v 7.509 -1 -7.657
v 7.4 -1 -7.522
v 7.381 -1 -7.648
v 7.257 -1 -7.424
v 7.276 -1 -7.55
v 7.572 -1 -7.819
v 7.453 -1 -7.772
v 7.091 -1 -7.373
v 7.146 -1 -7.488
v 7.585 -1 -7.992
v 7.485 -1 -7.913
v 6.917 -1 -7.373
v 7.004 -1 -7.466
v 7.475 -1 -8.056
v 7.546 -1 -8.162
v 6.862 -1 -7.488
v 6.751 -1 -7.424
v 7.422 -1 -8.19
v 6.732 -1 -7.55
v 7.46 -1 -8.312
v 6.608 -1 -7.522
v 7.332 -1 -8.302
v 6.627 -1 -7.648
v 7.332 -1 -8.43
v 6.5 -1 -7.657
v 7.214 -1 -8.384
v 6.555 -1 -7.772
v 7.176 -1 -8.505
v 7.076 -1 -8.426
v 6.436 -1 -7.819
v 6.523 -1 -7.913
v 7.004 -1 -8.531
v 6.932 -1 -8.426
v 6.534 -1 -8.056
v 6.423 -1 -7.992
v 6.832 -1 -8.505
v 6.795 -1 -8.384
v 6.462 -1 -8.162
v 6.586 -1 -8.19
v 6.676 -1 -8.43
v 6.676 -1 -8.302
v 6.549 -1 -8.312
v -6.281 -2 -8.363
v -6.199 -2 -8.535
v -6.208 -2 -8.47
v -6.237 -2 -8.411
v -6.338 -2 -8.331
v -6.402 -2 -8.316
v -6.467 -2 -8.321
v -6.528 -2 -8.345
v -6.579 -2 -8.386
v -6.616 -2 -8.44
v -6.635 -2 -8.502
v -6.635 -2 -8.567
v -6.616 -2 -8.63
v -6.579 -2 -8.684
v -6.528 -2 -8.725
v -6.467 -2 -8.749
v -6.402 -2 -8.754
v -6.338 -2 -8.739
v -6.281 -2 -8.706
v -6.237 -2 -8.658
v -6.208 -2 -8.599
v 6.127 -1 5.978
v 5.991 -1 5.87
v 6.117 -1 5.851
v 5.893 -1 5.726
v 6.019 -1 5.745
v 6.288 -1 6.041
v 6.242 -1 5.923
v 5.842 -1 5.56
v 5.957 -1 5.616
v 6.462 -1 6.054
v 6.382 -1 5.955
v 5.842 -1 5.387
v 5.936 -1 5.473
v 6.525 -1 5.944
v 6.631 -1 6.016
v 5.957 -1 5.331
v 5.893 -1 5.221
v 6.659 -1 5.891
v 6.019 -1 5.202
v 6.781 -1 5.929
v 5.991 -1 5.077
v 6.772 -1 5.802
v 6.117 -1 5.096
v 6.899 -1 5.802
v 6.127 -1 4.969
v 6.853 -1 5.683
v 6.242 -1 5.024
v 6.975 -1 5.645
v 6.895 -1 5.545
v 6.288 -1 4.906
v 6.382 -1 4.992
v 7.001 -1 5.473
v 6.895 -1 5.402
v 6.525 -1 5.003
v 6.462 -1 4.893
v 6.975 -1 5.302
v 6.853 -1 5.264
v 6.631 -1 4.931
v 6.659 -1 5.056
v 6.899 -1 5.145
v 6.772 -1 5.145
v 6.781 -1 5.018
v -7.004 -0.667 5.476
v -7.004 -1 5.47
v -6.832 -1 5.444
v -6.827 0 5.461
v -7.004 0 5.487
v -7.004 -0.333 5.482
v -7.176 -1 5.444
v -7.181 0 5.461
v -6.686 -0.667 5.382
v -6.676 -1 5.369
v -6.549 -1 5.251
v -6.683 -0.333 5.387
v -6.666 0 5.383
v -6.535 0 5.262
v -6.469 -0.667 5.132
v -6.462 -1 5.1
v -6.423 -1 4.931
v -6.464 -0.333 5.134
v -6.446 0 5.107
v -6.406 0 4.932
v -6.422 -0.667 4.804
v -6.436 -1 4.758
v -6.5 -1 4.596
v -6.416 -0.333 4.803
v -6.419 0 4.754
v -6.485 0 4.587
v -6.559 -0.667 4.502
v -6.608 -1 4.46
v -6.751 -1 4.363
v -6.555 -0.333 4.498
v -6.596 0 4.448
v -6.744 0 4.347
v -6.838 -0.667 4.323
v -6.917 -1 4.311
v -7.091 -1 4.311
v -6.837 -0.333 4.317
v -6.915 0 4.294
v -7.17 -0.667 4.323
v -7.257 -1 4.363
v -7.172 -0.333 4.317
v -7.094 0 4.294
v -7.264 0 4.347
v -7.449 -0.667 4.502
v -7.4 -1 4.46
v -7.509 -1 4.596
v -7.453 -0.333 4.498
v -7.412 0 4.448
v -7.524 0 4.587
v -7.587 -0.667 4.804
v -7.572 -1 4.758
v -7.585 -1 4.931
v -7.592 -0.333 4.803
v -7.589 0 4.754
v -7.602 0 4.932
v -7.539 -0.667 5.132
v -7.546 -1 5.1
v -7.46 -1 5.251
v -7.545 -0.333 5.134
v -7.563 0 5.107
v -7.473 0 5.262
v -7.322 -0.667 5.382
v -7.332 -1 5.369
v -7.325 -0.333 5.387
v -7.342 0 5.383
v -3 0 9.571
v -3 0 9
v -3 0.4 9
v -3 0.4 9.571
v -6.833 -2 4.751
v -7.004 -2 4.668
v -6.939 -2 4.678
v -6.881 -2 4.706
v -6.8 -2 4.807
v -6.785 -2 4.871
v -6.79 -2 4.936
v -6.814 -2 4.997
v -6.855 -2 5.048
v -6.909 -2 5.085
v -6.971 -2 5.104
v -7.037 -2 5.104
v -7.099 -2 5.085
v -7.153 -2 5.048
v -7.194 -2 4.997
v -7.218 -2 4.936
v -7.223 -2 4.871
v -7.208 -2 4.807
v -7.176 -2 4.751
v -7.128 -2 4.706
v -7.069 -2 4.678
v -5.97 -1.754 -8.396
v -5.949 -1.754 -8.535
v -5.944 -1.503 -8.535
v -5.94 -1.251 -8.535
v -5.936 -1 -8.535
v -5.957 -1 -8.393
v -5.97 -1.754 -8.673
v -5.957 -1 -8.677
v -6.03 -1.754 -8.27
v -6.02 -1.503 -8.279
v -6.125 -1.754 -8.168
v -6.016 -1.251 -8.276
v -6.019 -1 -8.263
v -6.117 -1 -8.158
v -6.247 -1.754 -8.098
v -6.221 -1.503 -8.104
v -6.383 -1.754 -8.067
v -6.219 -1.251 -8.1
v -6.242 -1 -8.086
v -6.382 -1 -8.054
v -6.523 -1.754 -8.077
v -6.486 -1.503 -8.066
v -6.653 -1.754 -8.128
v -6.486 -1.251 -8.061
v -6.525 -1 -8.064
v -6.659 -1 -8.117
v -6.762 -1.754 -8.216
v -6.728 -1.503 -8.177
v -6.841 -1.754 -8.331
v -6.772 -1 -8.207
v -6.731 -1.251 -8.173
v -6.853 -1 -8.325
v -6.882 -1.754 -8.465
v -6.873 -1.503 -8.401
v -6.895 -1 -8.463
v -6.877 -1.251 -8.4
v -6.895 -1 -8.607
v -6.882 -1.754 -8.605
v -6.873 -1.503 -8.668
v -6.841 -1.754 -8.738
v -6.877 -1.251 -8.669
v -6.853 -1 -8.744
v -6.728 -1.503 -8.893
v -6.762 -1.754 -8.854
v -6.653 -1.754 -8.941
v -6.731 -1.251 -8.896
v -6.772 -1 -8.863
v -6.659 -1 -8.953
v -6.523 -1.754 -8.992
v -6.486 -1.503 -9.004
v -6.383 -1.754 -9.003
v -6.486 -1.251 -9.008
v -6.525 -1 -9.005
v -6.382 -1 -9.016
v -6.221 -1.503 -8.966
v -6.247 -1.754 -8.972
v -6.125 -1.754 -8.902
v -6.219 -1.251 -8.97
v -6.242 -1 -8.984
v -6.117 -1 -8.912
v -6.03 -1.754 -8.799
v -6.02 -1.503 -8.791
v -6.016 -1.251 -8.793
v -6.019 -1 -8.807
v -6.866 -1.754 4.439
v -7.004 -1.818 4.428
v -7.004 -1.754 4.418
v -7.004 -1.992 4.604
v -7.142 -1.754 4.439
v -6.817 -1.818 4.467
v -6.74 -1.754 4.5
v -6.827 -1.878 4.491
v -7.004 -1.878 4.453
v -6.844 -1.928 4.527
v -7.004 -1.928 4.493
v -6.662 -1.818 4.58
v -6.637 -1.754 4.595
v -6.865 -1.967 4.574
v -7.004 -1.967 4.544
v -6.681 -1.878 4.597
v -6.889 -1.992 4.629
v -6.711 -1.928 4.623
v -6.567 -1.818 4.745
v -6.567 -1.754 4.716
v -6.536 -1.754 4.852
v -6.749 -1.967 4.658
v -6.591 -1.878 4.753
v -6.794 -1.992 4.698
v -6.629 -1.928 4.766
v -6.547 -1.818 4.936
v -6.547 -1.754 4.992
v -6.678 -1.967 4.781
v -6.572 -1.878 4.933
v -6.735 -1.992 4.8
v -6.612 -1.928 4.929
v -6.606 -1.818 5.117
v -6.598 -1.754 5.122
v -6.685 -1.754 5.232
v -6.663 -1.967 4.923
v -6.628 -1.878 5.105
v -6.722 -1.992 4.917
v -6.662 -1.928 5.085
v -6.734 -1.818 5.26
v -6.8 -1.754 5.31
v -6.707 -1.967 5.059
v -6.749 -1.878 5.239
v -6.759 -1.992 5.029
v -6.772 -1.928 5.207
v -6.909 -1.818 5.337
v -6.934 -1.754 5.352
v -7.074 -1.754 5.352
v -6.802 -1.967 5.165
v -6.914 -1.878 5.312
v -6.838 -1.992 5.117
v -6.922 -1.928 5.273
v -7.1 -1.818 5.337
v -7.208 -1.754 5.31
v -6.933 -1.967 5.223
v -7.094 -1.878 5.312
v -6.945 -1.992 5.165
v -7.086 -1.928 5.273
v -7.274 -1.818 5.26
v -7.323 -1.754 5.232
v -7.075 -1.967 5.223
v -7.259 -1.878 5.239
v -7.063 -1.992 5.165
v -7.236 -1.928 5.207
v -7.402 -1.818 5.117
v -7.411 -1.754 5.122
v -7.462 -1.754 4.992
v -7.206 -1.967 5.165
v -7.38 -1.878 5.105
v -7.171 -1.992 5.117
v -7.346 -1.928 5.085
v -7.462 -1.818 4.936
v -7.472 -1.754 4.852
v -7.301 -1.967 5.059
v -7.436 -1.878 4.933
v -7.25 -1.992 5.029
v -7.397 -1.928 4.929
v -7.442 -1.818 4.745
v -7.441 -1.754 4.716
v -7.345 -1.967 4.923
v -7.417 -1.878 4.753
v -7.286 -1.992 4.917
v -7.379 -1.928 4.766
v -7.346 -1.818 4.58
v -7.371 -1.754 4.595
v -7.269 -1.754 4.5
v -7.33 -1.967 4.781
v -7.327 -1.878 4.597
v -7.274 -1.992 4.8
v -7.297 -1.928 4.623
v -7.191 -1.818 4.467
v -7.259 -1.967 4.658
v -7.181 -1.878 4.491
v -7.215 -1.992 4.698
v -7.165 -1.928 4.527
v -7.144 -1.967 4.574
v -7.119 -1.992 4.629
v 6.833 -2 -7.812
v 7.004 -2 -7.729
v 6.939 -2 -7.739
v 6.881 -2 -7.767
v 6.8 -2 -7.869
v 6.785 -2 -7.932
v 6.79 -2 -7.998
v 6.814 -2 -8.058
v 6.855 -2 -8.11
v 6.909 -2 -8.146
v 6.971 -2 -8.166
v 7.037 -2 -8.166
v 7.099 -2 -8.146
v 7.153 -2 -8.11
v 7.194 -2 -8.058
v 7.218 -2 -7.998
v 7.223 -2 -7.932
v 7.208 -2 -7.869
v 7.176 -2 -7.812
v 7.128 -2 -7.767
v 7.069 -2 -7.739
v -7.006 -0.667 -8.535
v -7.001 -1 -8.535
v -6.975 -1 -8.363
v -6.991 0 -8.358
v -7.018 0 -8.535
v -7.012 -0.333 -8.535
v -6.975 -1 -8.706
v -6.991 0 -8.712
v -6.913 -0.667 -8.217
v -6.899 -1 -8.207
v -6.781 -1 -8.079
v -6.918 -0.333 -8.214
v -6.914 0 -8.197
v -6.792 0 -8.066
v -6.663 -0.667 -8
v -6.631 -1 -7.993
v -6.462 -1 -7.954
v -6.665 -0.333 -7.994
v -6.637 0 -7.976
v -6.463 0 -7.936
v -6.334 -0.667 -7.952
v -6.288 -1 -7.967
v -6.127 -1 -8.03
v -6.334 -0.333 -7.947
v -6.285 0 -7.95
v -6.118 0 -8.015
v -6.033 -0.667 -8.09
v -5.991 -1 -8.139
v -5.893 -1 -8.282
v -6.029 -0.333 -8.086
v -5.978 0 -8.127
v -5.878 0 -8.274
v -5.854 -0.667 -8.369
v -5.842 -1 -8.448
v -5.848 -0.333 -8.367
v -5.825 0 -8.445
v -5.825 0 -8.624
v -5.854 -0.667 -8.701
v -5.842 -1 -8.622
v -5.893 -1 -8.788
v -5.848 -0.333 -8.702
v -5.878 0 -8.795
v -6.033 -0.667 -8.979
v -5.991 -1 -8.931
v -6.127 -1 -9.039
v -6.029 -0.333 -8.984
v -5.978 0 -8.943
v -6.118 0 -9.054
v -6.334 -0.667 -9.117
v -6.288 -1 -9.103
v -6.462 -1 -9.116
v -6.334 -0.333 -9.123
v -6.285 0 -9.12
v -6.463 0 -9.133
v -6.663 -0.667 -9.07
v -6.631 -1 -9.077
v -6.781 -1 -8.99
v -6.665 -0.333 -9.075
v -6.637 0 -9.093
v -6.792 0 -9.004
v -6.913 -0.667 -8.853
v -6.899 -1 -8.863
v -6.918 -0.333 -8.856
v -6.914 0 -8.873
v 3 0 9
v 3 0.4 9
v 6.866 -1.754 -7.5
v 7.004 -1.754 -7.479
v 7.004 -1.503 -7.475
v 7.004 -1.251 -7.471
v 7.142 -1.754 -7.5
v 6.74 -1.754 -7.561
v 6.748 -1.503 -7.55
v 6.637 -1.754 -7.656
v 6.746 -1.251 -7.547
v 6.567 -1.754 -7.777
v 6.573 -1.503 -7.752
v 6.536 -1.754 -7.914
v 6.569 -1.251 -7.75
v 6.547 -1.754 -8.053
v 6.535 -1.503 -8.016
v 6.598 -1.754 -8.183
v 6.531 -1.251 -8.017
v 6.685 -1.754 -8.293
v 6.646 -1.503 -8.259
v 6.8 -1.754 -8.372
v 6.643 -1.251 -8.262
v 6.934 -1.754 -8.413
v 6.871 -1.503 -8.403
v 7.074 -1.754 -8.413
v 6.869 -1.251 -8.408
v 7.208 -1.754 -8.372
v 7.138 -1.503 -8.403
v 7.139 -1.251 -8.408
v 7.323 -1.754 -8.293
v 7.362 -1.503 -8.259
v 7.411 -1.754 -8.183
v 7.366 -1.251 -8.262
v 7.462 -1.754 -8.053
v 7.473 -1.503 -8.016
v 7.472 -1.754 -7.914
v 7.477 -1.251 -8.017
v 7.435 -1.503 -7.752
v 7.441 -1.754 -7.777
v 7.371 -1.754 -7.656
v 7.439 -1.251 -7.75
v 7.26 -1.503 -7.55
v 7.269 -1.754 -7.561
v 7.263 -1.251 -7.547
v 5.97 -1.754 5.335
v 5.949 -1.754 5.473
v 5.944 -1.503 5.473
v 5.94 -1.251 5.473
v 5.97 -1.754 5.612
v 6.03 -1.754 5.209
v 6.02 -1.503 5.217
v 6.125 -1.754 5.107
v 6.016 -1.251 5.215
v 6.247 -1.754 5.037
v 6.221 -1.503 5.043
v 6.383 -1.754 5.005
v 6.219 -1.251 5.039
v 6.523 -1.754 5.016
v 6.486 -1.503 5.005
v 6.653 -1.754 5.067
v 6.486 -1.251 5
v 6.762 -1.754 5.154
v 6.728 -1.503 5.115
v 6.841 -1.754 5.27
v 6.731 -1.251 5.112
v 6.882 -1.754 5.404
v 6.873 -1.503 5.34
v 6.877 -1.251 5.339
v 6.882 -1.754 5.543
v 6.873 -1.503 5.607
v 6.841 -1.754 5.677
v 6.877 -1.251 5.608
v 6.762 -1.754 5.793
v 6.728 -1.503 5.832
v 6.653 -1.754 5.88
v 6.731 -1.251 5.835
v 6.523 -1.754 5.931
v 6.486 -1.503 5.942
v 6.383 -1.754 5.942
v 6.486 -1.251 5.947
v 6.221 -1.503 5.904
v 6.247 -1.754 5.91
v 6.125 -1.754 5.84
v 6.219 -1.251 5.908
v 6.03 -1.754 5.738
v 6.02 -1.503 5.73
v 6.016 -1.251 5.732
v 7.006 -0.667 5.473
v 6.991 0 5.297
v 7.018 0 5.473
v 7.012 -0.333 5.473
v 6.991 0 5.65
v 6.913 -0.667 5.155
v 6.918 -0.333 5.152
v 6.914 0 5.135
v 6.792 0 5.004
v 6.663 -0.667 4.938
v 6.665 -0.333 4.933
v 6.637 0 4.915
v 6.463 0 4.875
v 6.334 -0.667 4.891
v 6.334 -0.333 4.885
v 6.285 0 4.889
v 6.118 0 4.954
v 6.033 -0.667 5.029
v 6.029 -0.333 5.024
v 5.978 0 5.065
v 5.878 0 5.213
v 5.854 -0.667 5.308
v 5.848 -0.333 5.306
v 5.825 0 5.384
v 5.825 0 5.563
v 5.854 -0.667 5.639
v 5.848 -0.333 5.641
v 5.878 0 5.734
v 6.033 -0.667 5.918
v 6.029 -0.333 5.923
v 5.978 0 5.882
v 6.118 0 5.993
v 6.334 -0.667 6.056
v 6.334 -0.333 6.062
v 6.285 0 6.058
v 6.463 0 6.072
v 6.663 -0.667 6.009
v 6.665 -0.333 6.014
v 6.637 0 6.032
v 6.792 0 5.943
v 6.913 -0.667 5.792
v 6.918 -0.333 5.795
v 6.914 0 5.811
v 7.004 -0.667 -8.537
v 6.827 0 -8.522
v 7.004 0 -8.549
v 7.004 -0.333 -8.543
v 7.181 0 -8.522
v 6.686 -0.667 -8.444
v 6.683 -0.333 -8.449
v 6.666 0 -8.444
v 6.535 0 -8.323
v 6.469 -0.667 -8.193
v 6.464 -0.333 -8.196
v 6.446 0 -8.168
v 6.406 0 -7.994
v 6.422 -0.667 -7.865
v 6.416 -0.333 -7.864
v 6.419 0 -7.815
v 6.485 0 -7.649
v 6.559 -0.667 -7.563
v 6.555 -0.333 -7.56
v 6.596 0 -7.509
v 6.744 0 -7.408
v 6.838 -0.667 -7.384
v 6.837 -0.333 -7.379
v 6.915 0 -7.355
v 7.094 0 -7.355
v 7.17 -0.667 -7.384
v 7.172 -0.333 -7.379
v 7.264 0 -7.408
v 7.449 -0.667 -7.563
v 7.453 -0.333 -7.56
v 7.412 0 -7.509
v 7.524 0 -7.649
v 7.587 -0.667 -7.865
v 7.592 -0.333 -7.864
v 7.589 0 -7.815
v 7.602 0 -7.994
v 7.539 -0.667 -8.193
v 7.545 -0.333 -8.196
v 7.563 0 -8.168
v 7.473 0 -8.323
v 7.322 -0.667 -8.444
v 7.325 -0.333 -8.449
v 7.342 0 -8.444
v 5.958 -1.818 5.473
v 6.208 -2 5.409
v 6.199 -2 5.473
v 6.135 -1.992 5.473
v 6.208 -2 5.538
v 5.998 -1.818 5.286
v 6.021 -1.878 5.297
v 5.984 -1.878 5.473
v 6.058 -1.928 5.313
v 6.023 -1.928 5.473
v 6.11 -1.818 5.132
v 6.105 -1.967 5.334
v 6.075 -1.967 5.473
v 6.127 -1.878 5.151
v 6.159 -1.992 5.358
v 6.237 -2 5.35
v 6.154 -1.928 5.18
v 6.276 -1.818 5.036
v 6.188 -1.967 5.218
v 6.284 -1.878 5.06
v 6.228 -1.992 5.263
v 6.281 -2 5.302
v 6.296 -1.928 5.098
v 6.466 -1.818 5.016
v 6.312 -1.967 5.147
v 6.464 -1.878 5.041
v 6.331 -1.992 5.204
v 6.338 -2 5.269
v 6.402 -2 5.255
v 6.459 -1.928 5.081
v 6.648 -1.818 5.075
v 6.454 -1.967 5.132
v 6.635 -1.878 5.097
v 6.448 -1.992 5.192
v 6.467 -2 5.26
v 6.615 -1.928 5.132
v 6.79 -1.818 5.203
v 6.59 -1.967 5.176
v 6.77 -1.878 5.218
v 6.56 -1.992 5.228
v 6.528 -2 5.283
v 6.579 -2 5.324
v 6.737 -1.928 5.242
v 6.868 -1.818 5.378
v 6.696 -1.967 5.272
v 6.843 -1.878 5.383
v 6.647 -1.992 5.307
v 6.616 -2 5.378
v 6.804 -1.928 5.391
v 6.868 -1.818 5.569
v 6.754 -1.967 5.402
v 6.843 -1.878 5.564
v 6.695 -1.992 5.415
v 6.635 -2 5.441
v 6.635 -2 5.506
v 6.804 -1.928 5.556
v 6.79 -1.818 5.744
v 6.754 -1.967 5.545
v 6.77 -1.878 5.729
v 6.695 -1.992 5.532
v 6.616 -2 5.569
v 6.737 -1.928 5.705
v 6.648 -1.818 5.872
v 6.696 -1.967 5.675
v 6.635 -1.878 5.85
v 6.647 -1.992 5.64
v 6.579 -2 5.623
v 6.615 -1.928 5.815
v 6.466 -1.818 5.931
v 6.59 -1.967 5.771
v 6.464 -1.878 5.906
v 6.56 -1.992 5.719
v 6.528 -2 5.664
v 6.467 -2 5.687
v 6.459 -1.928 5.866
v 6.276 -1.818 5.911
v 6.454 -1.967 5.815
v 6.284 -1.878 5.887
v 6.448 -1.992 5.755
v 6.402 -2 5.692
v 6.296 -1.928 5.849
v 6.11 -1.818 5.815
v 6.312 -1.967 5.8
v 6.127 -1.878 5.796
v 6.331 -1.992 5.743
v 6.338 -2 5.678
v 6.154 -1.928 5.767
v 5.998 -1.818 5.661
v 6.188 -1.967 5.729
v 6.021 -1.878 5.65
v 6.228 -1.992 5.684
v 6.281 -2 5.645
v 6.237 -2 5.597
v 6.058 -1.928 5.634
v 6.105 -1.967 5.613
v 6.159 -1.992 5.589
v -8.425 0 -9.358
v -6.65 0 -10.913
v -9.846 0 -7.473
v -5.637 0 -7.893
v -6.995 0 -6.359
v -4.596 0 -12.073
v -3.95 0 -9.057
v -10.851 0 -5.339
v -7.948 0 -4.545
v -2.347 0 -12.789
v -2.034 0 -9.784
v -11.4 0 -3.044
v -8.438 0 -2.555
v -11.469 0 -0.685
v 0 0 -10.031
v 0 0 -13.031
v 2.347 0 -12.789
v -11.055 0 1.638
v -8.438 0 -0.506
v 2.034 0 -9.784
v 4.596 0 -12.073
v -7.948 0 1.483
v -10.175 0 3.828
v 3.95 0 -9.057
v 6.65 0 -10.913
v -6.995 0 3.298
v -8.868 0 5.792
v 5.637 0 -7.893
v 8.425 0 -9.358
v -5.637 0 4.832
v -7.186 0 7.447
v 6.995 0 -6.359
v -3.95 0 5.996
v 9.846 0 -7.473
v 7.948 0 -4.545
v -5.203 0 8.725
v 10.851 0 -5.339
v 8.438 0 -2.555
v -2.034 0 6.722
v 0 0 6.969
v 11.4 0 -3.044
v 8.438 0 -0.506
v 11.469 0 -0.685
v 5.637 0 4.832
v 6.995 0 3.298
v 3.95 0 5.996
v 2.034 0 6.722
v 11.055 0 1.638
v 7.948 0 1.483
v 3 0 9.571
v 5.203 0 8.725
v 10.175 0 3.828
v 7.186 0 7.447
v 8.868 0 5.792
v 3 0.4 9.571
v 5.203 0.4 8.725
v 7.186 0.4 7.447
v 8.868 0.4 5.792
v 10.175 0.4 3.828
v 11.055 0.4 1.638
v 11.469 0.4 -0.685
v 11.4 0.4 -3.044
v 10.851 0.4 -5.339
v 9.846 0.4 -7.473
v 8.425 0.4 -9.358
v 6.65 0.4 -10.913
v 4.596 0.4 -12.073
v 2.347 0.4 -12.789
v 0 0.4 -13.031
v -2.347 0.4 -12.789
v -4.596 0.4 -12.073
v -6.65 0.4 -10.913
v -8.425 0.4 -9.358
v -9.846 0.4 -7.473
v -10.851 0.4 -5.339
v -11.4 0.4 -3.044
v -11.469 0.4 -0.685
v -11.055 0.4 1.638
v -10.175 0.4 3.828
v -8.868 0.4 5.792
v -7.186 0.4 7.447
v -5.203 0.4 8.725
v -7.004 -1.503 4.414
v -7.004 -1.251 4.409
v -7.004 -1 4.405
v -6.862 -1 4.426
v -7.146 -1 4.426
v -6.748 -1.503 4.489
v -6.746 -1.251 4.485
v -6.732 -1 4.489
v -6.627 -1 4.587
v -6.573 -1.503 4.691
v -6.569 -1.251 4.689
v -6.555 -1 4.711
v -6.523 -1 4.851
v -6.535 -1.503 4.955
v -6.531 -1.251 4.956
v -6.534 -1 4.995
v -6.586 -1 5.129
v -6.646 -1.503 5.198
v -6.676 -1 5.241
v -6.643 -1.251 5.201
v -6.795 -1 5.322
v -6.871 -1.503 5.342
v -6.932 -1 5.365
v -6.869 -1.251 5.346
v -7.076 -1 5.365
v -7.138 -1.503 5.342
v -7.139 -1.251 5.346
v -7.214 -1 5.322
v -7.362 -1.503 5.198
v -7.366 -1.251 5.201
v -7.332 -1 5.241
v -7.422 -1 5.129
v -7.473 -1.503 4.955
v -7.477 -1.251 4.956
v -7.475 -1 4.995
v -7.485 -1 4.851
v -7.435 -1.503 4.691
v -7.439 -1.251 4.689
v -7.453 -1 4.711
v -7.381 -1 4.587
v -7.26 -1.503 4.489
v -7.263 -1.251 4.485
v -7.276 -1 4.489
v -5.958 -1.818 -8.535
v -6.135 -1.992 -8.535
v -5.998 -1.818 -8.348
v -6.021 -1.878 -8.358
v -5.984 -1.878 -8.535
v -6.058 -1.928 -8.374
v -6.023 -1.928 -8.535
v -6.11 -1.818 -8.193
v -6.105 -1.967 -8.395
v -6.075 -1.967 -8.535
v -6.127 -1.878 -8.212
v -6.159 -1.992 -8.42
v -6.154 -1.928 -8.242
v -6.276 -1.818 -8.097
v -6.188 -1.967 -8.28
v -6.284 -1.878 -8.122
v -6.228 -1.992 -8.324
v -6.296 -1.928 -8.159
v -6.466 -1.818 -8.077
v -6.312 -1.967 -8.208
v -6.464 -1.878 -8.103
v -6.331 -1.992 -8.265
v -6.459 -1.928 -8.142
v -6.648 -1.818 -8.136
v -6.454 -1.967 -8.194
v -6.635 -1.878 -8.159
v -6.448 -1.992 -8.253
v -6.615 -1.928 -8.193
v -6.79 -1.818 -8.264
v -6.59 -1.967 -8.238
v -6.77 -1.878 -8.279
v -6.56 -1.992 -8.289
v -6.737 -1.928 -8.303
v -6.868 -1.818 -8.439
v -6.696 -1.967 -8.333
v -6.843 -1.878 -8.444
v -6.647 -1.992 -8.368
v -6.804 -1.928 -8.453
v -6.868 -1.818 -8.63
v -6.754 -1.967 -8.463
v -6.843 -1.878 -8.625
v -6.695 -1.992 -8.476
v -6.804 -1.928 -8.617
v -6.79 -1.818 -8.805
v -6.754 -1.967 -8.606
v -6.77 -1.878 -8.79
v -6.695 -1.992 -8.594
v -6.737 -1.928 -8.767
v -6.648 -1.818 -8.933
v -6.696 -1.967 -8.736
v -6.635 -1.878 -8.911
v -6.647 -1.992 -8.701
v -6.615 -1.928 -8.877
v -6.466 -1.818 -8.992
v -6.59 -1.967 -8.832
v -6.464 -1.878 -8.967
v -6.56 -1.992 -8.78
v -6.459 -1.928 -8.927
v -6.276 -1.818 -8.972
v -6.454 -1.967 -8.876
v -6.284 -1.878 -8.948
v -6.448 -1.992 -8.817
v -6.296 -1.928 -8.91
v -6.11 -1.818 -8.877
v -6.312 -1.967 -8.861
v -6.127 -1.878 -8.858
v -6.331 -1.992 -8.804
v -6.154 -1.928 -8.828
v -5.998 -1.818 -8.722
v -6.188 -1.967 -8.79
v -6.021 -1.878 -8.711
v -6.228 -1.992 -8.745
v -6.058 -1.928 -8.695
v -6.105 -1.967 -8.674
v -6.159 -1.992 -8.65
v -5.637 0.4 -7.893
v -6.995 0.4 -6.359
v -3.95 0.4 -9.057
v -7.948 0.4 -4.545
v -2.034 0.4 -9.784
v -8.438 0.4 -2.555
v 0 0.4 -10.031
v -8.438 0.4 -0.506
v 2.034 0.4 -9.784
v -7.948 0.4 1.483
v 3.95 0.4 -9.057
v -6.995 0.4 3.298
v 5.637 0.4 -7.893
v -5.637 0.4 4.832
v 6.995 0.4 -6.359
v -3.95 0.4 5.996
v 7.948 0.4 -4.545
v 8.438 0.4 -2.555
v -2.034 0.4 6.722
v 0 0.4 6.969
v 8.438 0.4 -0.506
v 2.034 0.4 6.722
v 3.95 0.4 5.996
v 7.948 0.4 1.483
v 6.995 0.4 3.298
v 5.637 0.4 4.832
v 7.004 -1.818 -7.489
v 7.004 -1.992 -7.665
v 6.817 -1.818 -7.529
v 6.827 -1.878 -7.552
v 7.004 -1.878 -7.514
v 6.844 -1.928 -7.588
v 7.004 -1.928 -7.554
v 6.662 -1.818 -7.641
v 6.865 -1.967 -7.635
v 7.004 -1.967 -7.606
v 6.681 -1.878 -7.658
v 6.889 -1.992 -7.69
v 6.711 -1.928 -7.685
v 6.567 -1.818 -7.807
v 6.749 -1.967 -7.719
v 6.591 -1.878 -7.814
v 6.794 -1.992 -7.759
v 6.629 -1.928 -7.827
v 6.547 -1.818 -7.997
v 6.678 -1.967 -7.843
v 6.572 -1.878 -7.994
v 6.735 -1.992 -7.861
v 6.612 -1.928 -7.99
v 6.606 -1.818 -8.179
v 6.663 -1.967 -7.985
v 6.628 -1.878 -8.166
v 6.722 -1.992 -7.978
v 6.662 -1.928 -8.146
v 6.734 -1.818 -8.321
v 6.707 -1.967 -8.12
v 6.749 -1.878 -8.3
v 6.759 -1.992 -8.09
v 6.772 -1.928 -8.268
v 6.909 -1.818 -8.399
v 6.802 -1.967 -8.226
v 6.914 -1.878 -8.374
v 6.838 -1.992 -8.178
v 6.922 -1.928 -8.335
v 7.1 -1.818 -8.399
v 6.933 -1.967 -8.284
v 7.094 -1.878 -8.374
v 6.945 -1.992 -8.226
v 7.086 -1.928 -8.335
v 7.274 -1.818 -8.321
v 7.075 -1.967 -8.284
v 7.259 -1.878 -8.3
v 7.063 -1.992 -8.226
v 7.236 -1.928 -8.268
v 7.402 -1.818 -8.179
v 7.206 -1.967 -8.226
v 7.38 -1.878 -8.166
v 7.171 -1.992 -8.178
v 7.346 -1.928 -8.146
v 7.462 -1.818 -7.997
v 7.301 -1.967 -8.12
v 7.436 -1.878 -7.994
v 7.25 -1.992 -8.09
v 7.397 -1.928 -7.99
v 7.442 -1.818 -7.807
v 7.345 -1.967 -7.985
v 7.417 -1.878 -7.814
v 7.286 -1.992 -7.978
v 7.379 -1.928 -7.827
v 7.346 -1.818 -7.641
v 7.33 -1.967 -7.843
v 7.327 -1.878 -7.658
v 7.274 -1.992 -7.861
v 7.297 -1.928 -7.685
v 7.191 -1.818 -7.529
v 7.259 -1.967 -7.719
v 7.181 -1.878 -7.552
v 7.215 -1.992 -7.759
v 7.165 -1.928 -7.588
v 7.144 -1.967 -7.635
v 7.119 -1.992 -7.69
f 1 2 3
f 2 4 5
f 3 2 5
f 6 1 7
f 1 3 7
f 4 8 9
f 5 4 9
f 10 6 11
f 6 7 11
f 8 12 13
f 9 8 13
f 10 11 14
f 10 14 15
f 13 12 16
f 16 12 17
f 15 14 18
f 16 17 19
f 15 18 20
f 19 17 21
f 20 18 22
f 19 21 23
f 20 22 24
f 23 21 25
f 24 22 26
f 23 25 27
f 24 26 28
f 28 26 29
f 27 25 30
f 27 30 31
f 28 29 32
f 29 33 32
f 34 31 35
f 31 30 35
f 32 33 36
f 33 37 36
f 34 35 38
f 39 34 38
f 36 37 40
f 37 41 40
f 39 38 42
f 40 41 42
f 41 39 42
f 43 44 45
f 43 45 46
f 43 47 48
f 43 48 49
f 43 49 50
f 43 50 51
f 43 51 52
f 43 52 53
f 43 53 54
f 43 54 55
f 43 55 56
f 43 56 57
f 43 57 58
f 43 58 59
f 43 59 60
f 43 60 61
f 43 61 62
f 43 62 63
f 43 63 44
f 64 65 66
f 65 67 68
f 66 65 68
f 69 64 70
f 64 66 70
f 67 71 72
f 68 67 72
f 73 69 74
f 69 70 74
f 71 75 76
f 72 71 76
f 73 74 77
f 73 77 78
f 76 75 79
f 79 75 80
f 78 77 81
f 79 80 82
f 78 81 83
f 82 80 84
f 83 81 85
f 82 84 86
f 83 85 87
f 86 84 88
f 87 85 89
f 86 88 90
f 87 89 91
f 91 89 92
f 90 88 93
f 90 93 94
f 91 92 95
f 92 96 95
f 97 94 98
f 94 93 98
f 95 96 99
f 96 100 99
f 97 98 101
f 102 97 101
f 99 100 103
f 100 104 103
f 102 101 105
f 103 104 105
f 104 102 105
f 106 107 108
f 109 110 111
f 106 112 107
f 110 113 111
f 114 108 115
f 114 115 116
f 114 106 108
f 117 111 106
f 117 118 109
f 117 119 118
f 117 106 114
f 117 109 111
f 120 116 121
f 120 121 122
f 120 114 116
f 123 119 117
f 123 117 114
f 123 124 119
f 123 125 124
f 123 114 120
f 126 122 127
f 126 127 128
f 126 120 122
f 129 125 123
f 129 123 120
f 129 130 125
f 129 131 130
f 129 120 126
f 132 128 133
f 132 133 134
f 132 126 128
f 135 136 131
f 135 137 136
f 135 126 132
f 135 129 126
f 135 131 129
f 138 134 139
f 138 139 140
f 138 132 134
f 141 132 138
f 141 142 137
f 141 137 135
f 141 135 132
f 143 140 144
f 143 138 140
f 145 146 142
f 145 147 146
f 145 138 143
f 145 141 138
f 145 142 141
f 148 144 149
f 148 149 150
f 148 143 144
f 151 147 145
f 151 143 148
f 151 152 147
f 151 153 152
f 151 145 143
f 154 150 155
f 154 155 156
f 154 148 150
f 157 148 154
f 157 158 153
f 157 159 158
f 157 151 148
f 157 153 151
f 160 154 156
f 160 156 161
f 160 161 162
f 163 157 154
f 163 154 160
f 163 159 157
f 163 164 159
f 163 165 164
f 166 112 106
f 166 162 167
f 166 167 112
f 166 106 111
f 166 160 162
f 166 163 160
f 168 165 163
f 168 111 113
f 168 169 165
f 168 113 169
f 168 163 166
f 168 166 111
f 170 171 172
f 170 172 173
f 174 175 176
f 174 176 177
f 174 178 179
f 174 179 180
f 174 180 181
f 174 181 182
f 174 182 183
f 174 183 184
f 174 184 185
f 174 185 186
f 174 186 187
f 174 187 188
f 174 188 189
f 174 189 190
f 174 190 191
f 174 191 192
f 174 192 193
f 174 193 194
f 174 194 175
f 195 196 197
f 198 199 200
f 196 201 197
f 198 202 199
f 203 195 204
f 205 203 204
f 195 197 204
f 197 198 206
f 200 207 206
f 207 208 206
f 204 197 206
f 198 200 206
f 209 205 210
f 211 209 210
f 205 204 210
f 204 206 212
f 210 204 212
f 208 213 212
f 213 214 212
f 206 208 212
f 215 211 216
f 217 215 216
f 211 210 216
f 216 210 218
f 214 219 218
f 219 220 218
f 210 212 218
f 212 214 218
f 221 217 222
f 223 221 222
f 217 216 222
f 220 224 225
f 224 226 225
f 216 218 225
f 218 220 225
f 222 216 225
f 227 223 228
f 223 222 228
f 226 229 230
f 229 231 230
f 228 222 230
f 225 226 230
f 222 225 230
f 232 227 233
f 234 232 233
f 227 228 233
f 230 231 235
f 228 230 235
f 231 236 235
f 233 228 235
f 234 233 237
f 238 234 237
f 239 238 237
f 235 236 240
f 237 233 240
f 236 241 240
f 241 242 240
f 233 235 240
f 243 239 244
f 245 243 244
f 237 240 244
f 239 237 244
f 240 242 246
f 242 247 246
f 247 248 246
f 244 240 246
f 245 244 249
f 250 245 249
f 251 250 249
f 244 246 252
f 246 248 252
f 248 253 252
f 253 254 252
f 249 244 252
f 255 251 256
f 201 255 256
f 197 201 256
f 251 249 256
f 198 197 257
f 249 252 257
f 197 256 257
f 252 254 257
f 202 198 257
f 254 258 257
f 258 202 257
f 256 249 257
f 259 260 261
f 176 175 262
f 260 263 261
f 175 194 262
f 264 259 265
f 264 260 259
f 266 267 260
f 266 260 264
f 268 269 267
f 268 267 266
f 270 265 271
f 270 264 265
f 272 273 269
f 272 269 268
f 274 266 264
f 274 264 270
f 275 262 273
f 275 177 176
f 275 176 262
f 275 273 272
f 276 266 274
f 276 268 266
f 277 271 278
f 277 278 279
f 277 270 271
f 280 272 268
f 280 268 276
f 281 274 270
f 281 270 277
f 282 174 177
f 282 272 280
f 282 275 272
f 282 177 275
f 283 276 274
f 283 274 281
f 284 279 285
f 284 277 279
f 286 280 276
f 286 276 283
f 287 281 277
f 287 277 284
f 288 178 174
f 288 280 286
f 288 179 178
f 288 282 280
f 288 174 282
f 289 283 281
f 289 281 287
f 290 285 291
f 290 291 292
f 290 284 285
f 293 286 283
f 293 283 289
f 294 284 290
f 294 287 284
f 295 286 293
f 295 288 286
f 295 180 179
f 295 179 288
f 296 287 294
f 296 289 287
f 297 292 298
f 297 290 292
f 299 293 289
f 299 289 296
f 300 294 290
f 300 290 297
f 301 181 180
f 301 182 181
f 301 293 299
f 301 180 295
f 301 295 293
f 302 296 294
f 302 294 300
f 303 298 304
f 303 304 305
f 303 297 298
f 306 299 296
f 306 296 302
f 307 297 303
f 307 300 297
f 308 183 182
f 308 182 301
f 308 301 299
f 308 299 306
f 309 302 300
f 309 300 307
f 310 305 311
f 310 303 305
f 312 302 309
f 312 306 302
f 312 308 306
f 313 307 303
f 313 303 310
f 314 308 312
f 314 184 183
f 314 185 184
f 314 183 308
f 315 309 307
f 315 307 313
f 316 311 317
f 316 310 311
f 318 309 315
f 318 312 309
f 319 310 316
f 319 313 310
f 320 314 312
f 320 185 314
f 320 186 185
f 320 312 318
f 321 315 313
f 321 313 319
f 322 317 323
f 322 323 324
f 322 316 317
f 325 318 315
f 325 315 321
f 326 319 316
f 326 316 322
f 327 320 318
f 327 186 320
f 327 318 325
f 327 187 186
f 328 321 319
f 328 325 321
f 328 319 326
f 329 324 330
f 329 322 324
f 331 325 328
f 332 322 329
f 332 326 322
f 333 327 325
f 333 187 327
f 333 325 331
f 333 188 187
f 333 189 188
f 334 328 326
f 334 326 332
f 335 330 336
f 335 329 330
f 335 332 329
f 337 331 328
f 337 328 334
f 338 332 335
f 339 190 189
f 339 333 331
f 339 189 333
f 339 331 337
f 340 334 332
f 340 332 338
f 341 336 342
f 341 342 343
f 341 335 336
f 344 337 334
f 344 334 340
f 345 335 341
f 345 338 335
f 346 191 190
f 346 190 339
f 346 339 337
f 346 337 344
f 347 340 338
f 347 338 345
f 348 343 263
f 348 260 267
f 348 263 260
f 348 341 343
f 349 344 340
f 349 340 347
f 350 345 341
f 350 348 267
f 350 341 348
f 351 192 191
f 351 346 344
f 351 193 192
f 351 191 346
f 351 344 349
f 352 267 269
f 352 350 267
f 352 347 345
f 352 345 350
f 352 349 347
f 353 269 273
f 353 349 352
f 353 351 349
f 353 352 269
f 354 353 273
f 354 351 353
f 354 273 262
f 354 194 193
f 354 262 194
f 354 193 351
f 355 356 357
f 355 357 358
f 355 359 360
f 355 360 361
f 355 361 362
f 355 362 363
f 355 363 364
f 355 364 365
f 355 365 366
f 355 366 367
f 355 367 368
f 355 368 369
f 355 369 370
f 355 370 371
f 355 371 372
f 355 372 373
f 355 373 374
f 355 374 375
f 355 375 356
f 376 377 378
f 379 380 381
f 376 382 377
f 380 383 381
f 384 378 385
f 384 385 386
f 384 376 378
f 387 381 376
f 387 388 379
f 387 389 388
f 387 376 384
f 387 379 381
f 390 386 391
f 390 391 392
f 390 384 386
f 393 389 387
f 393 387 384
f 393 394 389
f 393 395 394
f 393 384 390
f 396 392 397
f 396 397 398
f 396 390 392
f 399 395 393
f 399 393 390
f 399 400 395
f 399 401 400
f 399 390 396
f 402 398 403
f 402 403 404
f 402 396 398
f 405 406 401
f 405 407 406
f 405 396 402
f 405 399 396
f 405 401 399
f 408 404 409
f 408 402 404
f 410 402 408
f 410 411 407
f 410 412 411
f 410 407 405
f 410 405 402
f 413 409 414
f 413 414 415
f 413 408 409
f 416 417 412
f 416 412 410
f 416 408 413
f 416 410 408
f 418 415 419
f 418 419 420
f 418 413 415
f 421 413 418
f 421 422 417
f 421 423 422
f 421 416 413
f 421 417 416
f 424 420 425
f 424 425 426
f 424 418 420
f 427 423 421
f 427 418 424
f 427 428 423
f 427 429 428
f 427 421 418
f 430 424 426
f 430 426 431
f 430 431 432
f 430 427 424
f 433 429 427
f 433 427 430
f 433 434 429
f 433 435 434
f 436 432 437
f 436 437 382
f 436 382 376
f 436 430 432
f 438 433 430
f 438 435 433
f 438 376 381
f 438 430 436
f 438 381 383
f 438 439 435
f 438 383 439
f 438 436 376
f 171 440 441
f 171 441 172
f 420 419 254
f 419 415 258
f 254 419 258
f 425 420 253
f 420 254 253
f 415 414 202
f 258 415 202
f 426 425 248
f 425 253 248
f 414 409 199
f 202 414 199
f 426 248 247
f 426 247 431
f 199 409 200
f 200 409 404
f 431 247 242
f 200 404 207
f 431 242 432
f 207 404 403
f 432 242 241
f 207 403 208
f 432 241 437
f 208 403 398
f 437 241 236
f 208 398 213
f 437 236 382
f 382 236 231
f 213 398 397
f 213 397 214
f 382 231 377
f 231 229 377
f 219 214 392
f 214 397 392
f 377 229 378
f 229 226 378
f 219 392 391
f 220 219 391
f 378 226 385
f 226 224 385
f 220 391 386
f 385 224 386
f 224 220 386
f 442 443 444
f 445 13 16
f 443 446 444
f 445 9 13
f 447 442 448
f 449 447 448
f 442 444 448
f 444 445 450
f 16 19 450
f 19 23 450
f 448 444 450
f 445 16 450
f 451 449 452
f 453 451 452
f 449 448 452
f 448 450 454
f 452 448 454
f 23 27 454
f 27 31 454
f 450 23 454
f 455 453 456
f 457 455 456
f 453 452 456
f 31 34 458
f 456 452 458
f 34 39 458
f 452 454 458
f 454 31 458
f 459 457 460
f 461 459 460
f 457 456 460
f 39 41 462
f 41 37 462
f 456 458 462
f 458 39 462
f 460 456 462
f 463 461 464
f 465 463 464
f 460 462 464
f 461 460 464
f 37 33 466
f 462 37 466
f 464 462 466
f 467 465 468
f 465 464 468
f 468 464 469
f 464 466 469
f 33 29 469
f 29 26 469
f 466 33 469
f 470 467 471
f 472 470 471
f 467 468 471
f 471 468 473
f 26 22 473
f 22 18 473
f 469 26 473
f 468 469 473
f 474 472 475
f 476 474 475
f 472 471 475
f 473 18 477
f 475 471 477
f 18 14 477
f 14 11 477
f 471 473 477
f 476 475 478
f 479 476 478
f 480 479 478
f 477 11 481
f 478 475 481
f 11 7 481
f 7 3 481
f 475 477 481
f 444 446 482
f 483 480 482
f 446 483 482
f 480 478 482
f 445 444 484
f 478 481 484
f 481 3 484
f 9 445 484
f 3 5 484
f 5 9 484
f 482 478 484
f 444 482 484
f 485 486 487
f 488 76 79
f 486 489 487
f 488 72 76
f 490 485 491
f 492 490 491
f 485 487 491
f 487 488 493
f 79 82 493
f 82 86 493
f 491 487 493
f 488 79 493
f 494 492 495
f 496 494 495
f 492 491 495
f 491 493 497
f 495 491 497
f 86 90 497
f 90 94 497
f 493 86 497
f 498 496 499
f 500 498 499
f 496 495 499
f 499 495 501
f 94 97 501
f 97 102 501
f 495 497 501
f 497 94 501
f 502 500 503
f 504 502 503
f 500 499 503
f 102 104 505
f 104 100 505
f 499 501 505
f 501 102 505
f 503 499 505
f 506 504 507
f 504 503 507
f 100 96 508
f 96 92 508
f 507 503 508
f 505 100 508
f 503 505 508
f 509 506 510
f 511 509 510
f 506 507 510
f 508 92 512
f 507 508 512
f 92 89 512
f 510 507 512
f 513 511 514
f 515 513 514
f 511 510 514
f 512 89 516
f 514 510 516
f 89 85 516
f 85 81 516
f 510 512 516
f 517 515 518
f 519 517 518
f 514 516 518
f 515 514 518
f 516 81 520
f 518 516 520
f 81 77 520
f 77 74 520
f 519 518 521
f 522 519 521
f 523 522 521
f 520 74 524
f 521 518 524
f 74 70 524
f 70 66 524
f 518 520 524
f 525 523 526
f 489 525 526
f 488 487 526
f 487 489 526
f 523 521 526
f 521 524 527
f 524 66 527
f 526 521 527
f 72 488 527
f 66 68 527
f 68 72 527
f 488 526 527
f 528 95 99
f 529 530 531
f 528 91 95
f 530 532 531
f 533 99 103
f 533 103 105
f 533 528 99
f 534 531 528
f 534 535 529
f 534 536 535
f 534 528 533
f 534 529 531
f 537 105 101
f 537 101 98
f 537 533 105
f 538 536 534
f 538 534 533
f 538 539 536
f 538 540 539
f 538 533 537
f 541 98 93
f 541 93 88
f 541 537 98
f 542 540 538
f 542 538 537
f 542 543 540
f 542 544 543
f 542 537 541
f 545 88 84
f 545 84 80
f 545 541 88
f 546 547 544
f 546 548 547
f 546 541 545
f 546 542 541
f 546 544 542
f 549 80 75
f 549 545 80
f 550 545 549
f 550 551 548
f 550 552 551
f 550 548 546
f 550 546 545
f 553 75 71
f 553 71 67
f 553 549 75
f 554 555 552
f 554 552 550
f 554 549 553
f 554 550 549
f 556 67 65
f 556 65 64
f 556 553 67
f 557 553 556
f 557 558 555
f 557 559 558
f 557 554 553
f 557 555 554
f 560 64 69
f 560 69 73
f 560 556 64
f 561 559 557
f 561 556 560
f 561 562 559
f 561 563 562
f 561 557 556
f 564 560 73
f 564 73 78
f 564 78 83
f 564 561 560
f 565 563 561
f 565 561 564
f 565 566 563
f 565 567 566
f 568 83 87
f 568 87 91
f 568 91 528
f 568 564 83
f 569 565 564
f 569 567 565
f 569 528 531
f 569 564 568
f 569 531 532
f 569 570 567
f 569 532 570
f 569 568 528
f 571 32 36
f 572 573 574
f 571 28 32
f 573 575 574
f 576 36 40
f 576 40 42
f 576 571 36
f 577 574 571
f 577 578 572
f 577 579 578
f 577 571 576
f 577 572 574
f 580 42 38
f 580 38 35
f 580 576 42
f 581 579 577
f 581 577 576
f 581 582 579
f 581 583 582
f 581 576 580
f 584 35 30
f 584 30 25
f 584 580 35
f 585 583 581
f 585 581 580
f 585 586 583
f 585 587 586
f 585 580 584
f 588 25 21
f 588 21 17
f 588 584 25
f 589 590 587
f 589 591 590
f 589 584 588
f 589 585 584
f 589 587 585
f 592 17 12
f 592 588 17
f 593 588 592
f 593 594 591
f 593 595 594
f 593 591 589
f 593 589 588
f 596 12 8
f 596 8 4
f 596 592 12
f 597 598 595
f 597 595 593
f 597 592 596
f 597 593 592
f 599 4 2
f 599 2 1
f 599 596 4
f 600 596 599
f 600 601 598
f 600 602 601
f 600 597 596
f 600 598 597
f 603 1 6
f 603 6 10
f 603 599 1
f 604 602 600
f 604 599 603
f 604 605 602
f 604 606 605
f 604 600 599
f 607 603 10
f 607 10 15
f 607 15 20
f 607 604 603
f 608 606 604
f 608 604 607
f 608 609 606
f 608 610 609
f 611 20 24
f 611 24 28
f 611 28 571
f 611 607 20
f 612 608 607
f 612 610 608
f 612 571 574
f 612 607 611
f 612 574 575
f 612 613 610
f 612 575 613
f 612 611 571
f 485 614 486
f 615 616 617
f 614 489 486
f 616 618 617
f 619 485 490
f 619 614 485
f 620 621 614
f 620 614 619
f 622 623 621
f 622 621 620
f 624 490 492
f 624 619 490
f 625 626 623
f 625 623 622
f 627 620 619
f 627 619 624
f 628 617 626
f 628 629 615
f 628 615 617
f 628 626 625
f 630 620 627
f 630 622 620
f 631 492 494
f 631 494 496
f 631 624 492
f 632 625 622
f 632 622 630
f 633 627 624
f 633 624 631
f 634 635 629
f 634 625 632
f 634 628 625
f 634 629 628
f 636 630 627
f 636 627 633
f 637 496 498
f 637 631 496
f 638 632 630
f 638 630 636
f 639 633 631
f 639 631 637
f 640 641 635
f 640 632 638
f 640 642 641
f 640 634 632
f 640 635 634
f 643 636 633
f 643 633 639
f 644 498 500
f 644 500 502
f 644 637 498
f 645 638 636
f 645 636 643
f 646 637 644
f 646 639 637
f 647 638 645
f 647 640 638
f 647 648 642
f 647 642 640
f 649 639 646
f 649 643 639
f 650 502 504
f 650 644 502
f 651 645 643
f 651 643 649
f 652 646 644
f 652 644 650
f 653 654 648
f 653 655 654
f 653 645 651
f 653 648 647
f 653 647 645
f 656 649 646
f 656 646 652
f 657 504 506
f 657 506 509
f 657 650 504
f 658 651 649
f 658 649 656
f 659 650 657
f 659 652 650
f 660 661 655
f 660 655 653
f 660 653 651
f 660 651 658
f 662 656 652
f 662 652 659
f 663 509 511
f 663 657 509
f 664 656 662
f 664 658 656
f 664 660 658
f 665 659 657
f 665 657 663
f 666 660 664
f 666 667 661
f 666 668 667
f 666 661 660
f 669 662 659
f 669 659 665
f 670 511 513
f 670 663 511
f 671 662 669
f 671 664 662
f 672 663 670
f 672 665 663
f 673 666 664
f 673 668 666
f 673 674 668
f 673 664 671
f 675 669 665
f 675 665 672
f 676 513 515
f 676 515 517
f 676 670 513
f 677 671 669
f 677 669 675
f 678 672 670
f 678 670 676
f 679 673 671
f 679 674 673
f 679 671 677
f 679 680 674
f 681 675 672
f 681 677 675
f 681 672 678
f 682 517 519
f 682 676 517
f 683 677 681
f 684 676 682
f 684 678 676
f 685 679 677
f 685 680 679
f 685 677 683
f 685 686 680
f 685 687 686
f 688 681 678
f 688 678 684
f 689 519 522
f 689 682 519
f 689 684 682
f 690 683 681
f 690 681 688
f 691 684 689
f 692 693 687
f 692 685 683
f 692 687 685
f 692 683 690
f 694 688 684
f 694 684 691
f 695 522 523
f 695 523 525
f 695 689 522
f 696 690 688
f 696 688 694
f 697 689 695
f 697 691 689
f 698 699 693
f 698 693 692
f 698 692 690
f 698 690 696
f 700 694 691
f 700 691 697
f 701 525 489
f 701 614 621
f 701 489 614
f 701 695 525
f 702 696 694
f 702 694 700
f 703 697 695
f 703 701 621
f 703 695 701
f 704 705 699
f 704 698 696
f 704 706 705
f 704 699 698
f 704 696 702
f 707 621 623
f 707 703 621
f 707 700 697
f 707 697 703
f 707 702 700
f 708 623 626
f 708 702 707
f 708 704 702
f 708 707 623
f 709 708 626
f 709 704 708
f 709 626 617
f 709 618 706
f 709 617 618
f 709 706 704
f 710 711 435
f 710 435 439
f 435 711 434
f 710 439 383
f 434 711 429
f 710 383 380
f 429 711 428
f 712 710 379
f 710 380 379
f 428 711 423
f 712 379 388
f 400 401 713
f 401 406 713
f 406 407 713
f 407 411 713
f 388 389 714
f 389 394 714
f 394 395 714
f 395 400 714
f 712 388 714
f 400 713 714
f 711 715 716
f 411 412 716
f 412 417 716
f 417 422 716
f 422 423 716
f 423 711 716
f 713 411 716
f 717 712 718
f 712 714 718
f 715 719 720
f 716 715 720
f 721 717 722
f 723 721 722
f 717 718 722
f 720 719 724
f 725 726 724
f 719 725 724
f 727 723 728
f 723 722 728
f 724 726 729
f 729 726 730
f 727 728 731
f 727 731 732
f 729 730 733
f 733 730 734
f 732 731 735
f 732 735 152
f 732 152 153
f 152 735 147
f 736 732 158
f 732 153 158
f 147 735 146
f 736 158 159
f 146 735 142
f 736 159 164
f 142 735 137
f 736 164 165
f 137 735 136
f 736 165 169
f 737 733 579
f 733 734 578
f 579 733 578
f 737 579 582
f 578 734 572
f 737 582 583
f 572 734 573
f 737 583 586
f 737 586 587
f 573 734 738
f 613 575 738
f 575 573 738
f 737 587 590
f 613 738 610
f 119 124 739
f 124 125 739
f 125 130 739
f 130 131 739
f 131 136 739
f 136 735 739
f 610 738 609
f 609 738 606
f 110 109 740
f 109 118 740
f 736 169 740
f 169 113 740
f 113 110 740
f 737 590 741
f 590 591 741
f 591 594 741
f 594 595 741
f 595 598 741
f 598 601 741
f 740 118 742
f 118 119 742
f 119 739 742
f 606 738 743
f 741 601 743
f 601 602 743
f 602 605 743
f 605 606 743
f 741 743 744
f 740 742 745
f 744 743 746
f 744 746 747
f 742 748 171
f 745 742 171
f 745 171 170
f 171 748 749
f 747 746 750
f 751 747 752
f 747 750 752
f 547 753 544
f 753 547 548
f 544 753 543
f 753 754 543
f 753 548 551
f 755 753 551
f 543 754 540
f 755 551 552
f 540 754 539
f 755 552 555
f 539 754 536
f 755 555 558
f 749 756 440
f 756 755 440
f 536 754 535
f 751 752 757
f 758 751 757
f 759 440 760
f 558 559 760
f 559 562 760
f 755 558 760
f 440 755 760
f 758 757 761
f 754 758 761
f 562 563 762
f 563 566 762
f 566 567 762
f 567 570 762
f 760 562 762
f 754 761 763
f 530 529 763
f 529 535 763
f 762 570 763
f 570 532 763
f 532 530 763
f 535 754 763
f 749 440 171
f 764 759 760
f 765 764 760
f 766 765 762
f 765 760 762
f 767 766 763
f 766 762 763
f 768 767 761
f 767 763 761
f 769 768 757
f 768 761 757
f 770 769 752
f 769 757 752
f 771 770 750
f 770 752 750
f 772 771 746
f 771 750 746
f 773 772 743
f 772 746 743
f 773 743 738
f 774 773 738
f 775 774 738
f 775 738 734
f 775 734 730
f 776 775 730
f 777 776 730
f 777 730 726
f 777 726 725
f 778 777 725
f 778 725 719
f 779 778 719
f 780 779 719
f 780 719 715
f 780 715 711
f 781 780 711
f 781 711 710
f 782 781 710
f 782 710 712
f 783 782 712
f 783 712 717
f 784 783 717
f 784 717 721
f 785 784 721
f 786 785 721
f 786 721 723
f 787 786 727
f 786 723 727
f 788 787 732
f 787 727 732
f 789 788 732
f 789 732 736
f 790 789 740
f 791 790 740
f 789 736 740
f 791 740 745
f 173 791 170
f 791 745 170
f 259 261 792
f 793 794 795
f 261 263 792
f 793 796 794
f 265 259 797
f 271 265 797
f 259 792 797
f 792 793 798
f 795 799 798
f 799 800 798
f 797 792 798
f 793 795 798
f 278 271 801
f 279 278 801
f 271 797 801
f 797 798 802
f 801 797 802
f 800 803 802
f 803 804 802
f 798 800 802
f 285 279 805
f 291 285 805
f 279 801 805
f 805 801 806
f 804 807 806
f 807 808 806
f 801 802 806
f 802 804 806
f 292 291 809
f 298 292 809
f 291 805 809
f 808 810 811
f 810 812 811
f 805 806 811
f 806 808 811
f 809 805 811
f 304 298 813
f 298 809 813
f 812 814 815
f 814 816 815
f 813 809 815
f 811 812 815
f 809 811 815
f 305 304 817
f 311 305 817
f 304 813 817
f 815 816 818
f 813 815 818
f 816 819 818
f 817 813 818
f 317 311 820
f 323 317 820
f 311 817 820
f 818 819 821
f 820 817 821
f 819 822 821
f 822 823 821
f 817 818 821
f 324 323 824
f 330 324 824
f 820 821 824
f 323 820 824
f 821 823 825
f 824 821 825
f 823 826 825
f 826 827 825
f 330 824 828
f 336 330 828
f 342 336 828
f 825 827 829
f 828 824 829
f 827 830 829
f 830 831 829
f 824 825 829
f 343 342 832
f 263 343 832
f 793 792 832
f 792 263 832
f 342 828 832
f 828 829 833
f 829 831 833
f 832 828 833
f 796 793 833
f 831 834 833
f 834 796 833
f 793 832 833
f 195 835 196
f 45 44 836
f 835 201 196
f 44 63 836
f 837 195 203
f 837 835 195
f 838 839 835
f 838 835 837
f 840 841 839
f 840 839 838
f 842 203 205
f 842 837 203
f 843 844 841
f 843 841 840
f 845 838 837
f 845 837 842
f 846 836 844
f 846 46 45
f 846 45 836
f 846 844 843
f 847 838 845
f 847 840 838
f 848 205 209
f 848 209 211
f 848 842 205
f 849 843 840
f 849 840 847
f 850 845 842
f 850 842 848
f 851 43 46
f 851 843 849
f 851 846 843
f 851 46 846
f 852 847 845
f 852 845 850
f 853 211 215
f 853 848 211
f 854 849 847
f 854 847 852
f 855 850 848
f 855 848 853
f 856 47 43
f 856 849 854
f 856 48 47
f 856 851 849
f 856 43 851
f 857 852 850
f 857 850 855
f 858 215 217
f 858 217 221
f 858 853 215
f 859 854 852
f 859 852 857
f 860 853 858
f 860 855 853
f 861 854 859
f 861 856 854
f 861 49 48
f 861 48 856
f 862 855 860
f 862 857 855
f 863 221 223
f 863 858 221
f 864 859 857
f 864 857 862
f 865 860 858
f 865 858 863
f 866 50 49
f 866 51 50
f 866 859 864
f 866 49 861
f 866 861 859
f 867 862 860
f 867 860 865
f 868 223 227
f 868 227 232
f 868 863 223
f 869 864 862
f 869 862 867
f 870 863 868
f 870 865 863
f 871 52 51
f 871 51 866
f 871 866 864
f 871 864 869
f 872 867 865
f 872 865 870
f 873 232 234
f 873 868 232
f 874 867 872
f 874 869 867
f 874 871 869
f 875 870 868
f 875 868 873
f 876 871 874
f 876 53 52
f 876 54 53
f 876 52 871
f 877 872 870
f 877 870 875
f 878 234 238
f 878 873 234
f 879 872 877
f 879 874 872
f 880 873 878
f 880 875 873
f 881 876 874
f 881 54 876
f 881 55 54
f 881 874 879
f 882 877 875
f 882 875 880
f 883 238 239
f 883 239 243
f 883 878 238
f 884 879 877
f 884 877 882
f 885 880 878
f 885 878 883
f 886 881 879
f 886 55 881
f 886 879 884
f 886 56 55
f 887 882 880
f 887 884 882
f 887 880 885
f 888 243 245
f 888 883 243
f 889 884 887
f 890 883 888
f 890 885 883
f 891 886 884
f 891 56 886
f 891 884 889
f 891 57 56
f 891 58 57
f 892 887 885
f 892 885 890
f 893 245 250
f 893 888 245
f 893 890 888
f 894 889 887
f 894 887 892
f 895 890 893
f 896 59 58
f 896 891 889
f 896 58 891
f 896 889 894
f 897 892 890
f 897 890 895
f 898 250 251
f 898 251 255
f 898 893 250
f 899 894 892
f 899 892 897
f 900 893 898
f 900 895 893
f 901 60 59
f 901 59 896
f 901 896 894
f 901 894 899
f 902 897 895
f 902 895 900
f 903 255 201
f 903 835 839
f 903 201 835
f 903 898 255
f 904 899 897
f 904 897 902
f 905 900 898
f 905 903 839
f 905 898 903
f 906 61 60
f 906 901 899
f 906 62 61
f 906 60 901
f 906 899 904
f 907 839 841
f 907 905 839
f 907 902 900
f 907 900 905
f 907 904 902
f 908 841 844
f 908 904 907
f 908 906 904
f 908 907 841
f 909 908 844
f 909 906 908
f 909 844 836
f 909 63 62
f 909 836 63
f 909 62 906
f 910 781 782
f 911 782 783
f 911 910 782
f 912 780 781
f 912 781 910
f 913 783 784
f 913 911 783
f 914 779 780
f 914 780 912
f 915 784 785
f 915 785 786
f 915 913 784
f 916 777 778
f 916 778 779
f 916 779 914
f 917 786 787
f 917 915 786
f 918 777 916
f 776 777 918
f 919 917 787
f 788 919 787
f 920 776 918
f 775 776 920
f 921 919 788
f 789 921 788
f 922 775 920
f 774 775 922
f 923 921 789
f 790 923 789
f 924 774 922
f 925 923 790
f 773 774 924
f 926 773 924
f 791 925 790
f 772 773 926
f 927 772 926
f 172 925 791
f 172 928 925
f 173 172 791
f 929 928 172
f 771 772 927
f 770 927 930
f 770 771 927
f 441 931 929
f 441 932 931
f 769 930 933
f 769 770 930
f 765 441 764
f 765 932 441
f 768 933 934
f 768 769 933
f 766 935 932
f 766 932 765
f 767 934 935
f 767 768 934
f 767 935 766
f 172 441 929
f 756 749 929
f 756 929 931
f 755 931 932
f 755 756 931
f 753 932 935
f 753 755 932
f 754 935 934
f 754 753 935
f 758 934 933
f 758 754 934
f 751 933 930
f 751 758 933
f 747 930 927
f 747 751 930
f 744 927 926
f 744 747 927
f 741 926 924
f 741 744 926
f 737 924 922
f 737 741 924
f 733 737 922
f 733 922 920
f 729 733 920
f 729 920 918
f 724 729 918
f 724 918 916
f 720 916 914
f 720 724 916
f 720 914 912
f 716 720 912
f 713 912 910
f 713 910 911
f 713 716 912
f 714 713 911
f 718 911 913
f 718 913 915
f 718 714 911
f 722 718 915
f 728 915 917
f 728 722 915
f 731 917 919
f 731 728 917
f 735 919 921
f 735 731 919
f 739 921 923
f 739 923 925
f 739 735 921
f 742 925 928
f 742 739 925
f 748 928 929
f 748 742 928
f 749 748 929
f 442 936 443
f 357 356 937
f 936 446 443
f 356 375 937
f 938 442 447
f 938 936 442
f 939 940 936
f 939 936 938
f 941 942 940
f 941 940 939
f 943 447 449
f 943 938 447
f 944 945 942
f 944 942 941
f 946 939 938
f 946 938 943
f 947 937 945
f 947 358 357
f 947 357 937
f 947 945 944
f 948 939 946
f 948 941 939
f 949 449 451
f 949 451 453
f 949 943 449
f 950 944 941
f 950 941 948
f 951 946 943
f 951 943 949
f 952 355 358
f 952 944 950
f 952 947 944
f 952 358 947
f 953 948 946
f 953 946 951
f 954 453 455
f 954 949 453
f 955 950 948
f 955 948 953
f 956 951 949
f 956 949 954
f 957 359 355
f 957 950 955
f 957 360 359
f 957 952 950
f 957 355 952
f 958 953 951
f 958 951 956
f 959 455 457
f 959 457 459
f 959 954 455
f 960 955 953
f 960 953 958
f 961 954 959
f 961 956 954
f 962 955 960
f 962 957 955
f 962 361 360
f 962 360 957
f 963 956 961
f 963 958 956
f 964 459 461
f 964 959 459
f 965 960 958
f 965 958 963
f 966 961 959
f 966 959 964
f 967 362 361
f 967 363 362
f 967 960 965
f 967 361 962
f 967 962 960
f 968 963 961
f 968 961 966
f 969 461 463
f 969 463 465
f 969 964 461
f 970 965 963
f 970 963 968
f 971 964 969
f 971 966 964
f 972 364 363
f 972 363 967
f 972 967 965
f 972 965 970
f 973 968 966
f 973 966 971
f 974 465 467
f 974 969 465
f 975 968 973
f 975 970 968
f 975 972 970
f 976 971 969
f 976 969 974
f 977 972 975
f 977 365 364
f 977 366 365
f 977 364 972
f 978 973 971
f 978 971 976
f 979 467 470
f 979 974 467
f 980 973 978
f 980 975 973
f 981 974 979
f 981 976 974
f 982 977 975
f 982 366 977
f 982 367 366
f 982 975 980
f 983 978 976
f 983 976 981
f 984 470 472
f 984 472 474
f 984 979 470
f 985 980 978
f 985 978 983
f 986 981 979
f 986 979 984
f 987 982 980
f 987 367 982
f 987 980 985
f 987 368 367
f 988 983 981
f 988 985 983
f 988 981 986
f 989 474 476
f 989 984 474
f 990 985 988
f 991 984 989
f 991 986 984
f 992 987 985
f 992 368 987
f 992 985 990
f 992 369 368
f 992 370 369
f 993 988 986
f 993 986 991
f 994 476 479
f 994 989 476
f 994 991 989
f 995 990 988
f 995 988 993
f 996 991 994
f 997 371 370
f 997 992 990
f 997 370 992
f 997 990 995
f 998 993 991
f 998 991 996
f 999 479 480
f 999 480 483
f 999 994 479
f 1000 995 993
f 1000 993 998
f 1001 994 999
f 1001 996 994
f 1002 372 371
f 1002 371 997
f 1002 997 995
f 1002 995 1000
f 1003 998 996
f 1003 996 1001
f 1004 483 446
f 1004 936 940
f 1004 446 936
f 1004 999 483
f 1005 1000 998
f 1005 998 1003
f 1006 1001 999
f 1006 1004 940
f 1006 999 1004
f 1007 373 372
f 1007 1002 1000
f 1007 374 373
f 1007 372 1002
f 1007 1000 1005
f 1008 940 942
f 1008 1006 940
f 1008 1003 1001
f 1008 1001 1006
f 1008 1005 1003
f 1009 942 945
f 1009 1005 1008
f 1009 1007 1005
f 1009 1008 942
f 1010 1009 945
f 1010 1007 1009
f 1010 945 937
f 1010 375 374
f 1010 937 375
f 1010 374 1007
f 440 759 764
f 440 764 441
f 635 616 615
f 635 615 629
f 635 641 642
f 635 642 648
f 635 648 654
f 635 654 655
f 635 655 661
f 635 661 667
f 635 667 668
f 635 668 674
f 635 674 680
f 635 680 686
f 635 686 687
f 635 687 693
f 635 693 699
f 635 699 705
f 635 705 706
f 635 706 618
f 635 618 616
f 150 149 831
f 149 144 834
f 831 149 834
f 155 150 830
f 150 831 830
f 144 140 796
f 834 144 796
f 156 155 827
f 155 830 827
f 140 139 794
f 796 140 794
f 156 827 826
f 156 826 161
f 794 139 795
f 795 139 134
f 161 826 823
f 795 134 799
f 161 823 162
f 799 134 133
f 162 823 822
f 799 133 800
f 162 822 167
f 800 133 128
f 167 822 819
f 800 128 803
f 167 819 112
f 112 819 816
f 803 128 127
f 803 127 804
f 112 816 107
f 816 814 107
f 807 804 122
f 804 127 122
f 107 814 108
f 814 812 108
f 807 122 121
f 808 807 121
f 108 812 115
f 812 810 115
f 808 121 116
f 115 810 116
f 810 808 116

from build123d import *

# Parameters (mm, degrees)
SKETCH1_R           = 11.5
SKETCH1_R_2         = 8.5
BOSS_EXTRUDE1_DEPTH = 0.4
SKETCH2_R           = 0.6
BOSS_EXTRUDE2_DEPTH = 1
SKETCH3_R           = 0.5
BOSS_EXTRUDE3_DEPTH = 1
CIRPATTERN1_COUNT   = 4
DRAFT1_ANGLE        = 1
FILLET1_R           = 0.25
CUT_EXTRUDE1_START  = -0.4
CUT_EXTRUDE1_DEPTH  = 0.4


with BuildPart() as part:
    # Sketch1 → Boss-Extrude1 (new body)
    with BuildSketch(Plane(origin=(0, 0, 0), x_dir=(1, 0, 0), z_dir=(0, 1, 0))):
        with Locations(Location((0, 1.53064501, 0), (0, 0, 270))):
            Circle(SKETCH1_R)
        with Locations(Location((0, 1.53064501, 0), (0, 0, 270))):
            Circle(SKETCH1_R_2, mode=Mode.SUBTRACT)
    extrude(amount=BOSS_EXTRUDE1_DEPTH)

    # Sketch2 → Boss-Extrude2 (add)
    with BuildSketch(Plane(origin=(0, 0, 0), x_dir=(1, 0, 0), z_dir=(0, 1, 0))):
        with Locations(Location((-7.0041347, -4.887461962, 0), (0, 0, 270))):
            Circle(SKETCH2_R)
    boss_extrude2 = extrude(amount=-BOSS_EXTRUDE2_DEPTH)

    # Sketch3 → Boss-Extrude3 (add)
    with BuildSketch(Plane.XZ.offset(1)):
        with Locations(Location((-7.0041347, 4.887461962, 0), (0, 0, 270))):
            Circle(SKETCH3_R)
    boss_extrude3 = extrude(amount=BOSS_EXTRUDE3_DEPTH)

    # CirPattern1: Boss-Extrude2, Boss-Extrude3 ×4 about axis
    cirpattern1_axis = Axis((0, 0, -1.53064501), (0, 1, 0))
    add([boss_extrude2.rotate(cirpattern1_axis, i * 360 / CIRPATTERN1_COUNT) for i in range(1, CIRPATTERN1_COUNT)])
    add([boss_extrude3.rotate(cirpattern1_axis, i * 360 / CIRPATTERN1_COUNT) for i in range(1, CIRPATTERN1_COUNT)])

    # Draft1
    draft1_faces = [part.faces().sort_by_distance(p)[0] for p in [
        (5.818106972, -0.5, 5.47348969),
        (6.918106972, -1.5, 5.47348969),
        (7.0041347, -0.5, -7.348751982),
        (7.0041347, -1.5, -8.448751982),
        (-5.818106972, -0.5, -8.53477971),
        (-6.918106972, -1.5, -8.53477971),
        (-7.0041347, -0.5, 4.287461962),
        (-7.0041347, -1.5, 5.387461962),
    ]]
    draft(draft1_faces, Plane(origin=(0, 0, -1.53064501), x_dir=(0, 0, -1), z_dir=(0, -1, 0)), DRAFT1_ANGLE)

    # Fillet1
    fillet1_edges = [part.edges().sort_by_distance(p)[0] for p in [
        (-7.0041347, -2, 5.352551832),
        (-6.883196842, -2, -8.53477971),
        (7.0041347, -2, -8.413841852),
        (6.883196842, -2, 5.47348969),
    ]]
    fillet(fillet1_edges, radius=FILLET1_R)

    # Sketch6 → Cut-Extrude1 (cut)
    with BuildSketch(Plane(origin=(0, 0.4, 0), x_dir=(1, 0, 0), z_dir=(0, 1, 0)).offset(CUT_EXTRUDE1_START)):
        with BuildLine():
            Line((3, -9), (-3, -9))
            Line((-3, -9), (-3, -9.571156646))
            ThreePointArc((-3, -9.571156646), (0, -9.96935499), (3, -9.571156646))
            Line((3, -9.571156646), (3, -9))
        make_face()
    extrude(amount=CUT_EXTRUDE1_DEPTH, mode=Mode.SUBTRACT)


solid = part.part
